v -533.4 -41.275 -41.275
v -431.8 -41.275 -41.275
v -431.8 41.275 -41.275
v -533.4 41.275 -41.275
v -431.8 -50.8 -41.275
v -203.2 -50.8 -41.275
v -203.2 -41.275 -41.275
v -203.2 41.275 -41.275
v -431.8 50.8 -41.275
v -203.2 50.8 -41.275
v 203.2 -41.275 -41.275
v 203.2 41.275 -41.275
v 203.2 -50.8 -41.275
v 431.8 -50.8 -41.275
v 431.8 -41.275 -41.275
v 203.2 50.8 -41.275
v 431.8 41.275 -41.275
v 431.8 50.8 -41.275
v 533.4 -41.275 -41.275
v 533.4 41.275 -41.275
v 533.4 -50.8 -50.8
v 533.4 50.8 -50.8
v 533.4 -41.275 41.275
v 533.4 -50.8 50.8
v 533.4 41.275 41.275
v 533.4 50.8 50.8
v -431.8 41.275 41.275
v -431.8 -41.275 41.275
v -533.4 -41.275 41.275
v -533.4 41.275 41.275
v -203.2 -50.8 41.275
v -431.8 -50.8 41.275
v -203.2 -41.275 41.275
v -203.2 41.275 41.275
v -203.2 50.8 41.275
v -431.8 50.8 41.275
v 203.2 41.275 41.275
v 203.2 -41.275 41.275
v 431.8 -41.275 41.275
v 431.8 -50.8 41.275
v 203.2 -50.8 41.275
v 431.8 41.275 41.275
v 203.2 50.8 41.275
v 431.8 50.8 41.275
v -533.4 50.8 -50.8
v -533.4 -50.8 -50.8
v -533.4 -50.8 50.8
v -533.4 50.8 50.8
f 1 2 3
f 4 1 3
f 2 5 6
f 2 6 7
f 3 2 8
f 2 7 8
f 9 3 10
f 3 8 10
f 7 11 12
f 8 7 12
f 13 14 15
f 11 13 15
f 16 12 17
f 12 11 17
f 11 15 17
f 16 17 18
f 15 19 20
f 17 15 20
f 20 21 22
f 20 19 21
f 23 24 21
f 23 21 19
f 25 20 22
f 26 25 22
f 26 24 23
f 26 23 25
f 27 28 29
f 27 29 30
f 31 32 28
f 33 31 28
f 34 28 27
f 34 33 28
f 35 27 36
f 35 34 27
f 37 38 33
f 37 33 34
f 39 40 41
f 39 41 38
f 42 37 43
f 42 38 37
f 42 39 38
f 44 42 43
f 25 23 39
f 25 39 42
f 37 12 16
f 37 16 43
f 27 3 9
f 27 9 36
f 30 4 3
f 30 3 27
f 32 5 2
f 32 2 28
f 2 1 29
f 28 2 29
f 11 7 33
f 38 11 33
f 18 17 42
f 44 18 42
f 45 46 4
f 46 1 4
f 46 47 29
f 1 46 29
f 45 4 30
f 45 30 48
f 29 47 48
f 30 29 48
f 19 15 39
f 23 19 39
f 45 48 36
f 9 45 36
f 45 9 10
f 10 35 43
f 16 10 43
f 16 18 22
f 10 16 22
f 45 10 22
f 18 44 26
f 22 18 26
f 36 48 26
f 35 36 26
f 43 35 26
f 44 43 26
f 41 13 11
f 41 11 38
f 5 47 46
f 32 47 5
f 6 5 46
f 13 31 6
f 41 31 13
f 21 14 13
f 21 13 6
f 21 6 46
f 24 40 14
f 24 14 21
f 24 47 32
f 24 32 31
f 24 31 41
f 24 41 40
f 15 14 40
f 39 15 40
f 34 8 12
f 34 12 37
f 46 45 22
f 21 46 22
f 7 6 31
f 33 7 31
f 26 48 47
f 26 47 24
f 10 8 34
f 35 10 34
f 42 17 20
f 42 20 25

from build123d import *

# Parameters (mm, degrees)
F0_W     = 1066.8
F0_H     = 101.6
F1_DEPTH = 50.8
F2_W     = 82.55
F2_H     = 82.55
F3_DEPTH = 1066.801
F4_W     = 228.6
F4_H     = 82.55
F5_DEPTH = 101.601


with BuildPart() as f1:
    # F0 (on Top) → F1 (new body, symmetric)
    with BuildSketch(Plane.XY):
        Rectangle(F0_W, F0_H)
    extrude(amount=F1_DEPTH, both=True)

    # F2 (on face) → F3 (cut, through all)
    with BuildSketch(Plane.YZ.offset(533.4)):
        Rectangle(F2_W, F2_H)
    extrude(amount=-F3_DEPTH, mode=Mode.SUBTRACT)

    # F4 (on face) → F5 (cut, through all)
    with BuildSketch(Plane.XZ.offset(50.8)):
        with Locations((-317.5, 0)):
            Rectangle(F4_W, F4_H)
        with Locations((317.5, 0)):
            Rectangle(F4_W, F4_H)
    extrude(amount=-F5_DEPTH, mode=Mode.SUBTRACT)


solid = f1.part
